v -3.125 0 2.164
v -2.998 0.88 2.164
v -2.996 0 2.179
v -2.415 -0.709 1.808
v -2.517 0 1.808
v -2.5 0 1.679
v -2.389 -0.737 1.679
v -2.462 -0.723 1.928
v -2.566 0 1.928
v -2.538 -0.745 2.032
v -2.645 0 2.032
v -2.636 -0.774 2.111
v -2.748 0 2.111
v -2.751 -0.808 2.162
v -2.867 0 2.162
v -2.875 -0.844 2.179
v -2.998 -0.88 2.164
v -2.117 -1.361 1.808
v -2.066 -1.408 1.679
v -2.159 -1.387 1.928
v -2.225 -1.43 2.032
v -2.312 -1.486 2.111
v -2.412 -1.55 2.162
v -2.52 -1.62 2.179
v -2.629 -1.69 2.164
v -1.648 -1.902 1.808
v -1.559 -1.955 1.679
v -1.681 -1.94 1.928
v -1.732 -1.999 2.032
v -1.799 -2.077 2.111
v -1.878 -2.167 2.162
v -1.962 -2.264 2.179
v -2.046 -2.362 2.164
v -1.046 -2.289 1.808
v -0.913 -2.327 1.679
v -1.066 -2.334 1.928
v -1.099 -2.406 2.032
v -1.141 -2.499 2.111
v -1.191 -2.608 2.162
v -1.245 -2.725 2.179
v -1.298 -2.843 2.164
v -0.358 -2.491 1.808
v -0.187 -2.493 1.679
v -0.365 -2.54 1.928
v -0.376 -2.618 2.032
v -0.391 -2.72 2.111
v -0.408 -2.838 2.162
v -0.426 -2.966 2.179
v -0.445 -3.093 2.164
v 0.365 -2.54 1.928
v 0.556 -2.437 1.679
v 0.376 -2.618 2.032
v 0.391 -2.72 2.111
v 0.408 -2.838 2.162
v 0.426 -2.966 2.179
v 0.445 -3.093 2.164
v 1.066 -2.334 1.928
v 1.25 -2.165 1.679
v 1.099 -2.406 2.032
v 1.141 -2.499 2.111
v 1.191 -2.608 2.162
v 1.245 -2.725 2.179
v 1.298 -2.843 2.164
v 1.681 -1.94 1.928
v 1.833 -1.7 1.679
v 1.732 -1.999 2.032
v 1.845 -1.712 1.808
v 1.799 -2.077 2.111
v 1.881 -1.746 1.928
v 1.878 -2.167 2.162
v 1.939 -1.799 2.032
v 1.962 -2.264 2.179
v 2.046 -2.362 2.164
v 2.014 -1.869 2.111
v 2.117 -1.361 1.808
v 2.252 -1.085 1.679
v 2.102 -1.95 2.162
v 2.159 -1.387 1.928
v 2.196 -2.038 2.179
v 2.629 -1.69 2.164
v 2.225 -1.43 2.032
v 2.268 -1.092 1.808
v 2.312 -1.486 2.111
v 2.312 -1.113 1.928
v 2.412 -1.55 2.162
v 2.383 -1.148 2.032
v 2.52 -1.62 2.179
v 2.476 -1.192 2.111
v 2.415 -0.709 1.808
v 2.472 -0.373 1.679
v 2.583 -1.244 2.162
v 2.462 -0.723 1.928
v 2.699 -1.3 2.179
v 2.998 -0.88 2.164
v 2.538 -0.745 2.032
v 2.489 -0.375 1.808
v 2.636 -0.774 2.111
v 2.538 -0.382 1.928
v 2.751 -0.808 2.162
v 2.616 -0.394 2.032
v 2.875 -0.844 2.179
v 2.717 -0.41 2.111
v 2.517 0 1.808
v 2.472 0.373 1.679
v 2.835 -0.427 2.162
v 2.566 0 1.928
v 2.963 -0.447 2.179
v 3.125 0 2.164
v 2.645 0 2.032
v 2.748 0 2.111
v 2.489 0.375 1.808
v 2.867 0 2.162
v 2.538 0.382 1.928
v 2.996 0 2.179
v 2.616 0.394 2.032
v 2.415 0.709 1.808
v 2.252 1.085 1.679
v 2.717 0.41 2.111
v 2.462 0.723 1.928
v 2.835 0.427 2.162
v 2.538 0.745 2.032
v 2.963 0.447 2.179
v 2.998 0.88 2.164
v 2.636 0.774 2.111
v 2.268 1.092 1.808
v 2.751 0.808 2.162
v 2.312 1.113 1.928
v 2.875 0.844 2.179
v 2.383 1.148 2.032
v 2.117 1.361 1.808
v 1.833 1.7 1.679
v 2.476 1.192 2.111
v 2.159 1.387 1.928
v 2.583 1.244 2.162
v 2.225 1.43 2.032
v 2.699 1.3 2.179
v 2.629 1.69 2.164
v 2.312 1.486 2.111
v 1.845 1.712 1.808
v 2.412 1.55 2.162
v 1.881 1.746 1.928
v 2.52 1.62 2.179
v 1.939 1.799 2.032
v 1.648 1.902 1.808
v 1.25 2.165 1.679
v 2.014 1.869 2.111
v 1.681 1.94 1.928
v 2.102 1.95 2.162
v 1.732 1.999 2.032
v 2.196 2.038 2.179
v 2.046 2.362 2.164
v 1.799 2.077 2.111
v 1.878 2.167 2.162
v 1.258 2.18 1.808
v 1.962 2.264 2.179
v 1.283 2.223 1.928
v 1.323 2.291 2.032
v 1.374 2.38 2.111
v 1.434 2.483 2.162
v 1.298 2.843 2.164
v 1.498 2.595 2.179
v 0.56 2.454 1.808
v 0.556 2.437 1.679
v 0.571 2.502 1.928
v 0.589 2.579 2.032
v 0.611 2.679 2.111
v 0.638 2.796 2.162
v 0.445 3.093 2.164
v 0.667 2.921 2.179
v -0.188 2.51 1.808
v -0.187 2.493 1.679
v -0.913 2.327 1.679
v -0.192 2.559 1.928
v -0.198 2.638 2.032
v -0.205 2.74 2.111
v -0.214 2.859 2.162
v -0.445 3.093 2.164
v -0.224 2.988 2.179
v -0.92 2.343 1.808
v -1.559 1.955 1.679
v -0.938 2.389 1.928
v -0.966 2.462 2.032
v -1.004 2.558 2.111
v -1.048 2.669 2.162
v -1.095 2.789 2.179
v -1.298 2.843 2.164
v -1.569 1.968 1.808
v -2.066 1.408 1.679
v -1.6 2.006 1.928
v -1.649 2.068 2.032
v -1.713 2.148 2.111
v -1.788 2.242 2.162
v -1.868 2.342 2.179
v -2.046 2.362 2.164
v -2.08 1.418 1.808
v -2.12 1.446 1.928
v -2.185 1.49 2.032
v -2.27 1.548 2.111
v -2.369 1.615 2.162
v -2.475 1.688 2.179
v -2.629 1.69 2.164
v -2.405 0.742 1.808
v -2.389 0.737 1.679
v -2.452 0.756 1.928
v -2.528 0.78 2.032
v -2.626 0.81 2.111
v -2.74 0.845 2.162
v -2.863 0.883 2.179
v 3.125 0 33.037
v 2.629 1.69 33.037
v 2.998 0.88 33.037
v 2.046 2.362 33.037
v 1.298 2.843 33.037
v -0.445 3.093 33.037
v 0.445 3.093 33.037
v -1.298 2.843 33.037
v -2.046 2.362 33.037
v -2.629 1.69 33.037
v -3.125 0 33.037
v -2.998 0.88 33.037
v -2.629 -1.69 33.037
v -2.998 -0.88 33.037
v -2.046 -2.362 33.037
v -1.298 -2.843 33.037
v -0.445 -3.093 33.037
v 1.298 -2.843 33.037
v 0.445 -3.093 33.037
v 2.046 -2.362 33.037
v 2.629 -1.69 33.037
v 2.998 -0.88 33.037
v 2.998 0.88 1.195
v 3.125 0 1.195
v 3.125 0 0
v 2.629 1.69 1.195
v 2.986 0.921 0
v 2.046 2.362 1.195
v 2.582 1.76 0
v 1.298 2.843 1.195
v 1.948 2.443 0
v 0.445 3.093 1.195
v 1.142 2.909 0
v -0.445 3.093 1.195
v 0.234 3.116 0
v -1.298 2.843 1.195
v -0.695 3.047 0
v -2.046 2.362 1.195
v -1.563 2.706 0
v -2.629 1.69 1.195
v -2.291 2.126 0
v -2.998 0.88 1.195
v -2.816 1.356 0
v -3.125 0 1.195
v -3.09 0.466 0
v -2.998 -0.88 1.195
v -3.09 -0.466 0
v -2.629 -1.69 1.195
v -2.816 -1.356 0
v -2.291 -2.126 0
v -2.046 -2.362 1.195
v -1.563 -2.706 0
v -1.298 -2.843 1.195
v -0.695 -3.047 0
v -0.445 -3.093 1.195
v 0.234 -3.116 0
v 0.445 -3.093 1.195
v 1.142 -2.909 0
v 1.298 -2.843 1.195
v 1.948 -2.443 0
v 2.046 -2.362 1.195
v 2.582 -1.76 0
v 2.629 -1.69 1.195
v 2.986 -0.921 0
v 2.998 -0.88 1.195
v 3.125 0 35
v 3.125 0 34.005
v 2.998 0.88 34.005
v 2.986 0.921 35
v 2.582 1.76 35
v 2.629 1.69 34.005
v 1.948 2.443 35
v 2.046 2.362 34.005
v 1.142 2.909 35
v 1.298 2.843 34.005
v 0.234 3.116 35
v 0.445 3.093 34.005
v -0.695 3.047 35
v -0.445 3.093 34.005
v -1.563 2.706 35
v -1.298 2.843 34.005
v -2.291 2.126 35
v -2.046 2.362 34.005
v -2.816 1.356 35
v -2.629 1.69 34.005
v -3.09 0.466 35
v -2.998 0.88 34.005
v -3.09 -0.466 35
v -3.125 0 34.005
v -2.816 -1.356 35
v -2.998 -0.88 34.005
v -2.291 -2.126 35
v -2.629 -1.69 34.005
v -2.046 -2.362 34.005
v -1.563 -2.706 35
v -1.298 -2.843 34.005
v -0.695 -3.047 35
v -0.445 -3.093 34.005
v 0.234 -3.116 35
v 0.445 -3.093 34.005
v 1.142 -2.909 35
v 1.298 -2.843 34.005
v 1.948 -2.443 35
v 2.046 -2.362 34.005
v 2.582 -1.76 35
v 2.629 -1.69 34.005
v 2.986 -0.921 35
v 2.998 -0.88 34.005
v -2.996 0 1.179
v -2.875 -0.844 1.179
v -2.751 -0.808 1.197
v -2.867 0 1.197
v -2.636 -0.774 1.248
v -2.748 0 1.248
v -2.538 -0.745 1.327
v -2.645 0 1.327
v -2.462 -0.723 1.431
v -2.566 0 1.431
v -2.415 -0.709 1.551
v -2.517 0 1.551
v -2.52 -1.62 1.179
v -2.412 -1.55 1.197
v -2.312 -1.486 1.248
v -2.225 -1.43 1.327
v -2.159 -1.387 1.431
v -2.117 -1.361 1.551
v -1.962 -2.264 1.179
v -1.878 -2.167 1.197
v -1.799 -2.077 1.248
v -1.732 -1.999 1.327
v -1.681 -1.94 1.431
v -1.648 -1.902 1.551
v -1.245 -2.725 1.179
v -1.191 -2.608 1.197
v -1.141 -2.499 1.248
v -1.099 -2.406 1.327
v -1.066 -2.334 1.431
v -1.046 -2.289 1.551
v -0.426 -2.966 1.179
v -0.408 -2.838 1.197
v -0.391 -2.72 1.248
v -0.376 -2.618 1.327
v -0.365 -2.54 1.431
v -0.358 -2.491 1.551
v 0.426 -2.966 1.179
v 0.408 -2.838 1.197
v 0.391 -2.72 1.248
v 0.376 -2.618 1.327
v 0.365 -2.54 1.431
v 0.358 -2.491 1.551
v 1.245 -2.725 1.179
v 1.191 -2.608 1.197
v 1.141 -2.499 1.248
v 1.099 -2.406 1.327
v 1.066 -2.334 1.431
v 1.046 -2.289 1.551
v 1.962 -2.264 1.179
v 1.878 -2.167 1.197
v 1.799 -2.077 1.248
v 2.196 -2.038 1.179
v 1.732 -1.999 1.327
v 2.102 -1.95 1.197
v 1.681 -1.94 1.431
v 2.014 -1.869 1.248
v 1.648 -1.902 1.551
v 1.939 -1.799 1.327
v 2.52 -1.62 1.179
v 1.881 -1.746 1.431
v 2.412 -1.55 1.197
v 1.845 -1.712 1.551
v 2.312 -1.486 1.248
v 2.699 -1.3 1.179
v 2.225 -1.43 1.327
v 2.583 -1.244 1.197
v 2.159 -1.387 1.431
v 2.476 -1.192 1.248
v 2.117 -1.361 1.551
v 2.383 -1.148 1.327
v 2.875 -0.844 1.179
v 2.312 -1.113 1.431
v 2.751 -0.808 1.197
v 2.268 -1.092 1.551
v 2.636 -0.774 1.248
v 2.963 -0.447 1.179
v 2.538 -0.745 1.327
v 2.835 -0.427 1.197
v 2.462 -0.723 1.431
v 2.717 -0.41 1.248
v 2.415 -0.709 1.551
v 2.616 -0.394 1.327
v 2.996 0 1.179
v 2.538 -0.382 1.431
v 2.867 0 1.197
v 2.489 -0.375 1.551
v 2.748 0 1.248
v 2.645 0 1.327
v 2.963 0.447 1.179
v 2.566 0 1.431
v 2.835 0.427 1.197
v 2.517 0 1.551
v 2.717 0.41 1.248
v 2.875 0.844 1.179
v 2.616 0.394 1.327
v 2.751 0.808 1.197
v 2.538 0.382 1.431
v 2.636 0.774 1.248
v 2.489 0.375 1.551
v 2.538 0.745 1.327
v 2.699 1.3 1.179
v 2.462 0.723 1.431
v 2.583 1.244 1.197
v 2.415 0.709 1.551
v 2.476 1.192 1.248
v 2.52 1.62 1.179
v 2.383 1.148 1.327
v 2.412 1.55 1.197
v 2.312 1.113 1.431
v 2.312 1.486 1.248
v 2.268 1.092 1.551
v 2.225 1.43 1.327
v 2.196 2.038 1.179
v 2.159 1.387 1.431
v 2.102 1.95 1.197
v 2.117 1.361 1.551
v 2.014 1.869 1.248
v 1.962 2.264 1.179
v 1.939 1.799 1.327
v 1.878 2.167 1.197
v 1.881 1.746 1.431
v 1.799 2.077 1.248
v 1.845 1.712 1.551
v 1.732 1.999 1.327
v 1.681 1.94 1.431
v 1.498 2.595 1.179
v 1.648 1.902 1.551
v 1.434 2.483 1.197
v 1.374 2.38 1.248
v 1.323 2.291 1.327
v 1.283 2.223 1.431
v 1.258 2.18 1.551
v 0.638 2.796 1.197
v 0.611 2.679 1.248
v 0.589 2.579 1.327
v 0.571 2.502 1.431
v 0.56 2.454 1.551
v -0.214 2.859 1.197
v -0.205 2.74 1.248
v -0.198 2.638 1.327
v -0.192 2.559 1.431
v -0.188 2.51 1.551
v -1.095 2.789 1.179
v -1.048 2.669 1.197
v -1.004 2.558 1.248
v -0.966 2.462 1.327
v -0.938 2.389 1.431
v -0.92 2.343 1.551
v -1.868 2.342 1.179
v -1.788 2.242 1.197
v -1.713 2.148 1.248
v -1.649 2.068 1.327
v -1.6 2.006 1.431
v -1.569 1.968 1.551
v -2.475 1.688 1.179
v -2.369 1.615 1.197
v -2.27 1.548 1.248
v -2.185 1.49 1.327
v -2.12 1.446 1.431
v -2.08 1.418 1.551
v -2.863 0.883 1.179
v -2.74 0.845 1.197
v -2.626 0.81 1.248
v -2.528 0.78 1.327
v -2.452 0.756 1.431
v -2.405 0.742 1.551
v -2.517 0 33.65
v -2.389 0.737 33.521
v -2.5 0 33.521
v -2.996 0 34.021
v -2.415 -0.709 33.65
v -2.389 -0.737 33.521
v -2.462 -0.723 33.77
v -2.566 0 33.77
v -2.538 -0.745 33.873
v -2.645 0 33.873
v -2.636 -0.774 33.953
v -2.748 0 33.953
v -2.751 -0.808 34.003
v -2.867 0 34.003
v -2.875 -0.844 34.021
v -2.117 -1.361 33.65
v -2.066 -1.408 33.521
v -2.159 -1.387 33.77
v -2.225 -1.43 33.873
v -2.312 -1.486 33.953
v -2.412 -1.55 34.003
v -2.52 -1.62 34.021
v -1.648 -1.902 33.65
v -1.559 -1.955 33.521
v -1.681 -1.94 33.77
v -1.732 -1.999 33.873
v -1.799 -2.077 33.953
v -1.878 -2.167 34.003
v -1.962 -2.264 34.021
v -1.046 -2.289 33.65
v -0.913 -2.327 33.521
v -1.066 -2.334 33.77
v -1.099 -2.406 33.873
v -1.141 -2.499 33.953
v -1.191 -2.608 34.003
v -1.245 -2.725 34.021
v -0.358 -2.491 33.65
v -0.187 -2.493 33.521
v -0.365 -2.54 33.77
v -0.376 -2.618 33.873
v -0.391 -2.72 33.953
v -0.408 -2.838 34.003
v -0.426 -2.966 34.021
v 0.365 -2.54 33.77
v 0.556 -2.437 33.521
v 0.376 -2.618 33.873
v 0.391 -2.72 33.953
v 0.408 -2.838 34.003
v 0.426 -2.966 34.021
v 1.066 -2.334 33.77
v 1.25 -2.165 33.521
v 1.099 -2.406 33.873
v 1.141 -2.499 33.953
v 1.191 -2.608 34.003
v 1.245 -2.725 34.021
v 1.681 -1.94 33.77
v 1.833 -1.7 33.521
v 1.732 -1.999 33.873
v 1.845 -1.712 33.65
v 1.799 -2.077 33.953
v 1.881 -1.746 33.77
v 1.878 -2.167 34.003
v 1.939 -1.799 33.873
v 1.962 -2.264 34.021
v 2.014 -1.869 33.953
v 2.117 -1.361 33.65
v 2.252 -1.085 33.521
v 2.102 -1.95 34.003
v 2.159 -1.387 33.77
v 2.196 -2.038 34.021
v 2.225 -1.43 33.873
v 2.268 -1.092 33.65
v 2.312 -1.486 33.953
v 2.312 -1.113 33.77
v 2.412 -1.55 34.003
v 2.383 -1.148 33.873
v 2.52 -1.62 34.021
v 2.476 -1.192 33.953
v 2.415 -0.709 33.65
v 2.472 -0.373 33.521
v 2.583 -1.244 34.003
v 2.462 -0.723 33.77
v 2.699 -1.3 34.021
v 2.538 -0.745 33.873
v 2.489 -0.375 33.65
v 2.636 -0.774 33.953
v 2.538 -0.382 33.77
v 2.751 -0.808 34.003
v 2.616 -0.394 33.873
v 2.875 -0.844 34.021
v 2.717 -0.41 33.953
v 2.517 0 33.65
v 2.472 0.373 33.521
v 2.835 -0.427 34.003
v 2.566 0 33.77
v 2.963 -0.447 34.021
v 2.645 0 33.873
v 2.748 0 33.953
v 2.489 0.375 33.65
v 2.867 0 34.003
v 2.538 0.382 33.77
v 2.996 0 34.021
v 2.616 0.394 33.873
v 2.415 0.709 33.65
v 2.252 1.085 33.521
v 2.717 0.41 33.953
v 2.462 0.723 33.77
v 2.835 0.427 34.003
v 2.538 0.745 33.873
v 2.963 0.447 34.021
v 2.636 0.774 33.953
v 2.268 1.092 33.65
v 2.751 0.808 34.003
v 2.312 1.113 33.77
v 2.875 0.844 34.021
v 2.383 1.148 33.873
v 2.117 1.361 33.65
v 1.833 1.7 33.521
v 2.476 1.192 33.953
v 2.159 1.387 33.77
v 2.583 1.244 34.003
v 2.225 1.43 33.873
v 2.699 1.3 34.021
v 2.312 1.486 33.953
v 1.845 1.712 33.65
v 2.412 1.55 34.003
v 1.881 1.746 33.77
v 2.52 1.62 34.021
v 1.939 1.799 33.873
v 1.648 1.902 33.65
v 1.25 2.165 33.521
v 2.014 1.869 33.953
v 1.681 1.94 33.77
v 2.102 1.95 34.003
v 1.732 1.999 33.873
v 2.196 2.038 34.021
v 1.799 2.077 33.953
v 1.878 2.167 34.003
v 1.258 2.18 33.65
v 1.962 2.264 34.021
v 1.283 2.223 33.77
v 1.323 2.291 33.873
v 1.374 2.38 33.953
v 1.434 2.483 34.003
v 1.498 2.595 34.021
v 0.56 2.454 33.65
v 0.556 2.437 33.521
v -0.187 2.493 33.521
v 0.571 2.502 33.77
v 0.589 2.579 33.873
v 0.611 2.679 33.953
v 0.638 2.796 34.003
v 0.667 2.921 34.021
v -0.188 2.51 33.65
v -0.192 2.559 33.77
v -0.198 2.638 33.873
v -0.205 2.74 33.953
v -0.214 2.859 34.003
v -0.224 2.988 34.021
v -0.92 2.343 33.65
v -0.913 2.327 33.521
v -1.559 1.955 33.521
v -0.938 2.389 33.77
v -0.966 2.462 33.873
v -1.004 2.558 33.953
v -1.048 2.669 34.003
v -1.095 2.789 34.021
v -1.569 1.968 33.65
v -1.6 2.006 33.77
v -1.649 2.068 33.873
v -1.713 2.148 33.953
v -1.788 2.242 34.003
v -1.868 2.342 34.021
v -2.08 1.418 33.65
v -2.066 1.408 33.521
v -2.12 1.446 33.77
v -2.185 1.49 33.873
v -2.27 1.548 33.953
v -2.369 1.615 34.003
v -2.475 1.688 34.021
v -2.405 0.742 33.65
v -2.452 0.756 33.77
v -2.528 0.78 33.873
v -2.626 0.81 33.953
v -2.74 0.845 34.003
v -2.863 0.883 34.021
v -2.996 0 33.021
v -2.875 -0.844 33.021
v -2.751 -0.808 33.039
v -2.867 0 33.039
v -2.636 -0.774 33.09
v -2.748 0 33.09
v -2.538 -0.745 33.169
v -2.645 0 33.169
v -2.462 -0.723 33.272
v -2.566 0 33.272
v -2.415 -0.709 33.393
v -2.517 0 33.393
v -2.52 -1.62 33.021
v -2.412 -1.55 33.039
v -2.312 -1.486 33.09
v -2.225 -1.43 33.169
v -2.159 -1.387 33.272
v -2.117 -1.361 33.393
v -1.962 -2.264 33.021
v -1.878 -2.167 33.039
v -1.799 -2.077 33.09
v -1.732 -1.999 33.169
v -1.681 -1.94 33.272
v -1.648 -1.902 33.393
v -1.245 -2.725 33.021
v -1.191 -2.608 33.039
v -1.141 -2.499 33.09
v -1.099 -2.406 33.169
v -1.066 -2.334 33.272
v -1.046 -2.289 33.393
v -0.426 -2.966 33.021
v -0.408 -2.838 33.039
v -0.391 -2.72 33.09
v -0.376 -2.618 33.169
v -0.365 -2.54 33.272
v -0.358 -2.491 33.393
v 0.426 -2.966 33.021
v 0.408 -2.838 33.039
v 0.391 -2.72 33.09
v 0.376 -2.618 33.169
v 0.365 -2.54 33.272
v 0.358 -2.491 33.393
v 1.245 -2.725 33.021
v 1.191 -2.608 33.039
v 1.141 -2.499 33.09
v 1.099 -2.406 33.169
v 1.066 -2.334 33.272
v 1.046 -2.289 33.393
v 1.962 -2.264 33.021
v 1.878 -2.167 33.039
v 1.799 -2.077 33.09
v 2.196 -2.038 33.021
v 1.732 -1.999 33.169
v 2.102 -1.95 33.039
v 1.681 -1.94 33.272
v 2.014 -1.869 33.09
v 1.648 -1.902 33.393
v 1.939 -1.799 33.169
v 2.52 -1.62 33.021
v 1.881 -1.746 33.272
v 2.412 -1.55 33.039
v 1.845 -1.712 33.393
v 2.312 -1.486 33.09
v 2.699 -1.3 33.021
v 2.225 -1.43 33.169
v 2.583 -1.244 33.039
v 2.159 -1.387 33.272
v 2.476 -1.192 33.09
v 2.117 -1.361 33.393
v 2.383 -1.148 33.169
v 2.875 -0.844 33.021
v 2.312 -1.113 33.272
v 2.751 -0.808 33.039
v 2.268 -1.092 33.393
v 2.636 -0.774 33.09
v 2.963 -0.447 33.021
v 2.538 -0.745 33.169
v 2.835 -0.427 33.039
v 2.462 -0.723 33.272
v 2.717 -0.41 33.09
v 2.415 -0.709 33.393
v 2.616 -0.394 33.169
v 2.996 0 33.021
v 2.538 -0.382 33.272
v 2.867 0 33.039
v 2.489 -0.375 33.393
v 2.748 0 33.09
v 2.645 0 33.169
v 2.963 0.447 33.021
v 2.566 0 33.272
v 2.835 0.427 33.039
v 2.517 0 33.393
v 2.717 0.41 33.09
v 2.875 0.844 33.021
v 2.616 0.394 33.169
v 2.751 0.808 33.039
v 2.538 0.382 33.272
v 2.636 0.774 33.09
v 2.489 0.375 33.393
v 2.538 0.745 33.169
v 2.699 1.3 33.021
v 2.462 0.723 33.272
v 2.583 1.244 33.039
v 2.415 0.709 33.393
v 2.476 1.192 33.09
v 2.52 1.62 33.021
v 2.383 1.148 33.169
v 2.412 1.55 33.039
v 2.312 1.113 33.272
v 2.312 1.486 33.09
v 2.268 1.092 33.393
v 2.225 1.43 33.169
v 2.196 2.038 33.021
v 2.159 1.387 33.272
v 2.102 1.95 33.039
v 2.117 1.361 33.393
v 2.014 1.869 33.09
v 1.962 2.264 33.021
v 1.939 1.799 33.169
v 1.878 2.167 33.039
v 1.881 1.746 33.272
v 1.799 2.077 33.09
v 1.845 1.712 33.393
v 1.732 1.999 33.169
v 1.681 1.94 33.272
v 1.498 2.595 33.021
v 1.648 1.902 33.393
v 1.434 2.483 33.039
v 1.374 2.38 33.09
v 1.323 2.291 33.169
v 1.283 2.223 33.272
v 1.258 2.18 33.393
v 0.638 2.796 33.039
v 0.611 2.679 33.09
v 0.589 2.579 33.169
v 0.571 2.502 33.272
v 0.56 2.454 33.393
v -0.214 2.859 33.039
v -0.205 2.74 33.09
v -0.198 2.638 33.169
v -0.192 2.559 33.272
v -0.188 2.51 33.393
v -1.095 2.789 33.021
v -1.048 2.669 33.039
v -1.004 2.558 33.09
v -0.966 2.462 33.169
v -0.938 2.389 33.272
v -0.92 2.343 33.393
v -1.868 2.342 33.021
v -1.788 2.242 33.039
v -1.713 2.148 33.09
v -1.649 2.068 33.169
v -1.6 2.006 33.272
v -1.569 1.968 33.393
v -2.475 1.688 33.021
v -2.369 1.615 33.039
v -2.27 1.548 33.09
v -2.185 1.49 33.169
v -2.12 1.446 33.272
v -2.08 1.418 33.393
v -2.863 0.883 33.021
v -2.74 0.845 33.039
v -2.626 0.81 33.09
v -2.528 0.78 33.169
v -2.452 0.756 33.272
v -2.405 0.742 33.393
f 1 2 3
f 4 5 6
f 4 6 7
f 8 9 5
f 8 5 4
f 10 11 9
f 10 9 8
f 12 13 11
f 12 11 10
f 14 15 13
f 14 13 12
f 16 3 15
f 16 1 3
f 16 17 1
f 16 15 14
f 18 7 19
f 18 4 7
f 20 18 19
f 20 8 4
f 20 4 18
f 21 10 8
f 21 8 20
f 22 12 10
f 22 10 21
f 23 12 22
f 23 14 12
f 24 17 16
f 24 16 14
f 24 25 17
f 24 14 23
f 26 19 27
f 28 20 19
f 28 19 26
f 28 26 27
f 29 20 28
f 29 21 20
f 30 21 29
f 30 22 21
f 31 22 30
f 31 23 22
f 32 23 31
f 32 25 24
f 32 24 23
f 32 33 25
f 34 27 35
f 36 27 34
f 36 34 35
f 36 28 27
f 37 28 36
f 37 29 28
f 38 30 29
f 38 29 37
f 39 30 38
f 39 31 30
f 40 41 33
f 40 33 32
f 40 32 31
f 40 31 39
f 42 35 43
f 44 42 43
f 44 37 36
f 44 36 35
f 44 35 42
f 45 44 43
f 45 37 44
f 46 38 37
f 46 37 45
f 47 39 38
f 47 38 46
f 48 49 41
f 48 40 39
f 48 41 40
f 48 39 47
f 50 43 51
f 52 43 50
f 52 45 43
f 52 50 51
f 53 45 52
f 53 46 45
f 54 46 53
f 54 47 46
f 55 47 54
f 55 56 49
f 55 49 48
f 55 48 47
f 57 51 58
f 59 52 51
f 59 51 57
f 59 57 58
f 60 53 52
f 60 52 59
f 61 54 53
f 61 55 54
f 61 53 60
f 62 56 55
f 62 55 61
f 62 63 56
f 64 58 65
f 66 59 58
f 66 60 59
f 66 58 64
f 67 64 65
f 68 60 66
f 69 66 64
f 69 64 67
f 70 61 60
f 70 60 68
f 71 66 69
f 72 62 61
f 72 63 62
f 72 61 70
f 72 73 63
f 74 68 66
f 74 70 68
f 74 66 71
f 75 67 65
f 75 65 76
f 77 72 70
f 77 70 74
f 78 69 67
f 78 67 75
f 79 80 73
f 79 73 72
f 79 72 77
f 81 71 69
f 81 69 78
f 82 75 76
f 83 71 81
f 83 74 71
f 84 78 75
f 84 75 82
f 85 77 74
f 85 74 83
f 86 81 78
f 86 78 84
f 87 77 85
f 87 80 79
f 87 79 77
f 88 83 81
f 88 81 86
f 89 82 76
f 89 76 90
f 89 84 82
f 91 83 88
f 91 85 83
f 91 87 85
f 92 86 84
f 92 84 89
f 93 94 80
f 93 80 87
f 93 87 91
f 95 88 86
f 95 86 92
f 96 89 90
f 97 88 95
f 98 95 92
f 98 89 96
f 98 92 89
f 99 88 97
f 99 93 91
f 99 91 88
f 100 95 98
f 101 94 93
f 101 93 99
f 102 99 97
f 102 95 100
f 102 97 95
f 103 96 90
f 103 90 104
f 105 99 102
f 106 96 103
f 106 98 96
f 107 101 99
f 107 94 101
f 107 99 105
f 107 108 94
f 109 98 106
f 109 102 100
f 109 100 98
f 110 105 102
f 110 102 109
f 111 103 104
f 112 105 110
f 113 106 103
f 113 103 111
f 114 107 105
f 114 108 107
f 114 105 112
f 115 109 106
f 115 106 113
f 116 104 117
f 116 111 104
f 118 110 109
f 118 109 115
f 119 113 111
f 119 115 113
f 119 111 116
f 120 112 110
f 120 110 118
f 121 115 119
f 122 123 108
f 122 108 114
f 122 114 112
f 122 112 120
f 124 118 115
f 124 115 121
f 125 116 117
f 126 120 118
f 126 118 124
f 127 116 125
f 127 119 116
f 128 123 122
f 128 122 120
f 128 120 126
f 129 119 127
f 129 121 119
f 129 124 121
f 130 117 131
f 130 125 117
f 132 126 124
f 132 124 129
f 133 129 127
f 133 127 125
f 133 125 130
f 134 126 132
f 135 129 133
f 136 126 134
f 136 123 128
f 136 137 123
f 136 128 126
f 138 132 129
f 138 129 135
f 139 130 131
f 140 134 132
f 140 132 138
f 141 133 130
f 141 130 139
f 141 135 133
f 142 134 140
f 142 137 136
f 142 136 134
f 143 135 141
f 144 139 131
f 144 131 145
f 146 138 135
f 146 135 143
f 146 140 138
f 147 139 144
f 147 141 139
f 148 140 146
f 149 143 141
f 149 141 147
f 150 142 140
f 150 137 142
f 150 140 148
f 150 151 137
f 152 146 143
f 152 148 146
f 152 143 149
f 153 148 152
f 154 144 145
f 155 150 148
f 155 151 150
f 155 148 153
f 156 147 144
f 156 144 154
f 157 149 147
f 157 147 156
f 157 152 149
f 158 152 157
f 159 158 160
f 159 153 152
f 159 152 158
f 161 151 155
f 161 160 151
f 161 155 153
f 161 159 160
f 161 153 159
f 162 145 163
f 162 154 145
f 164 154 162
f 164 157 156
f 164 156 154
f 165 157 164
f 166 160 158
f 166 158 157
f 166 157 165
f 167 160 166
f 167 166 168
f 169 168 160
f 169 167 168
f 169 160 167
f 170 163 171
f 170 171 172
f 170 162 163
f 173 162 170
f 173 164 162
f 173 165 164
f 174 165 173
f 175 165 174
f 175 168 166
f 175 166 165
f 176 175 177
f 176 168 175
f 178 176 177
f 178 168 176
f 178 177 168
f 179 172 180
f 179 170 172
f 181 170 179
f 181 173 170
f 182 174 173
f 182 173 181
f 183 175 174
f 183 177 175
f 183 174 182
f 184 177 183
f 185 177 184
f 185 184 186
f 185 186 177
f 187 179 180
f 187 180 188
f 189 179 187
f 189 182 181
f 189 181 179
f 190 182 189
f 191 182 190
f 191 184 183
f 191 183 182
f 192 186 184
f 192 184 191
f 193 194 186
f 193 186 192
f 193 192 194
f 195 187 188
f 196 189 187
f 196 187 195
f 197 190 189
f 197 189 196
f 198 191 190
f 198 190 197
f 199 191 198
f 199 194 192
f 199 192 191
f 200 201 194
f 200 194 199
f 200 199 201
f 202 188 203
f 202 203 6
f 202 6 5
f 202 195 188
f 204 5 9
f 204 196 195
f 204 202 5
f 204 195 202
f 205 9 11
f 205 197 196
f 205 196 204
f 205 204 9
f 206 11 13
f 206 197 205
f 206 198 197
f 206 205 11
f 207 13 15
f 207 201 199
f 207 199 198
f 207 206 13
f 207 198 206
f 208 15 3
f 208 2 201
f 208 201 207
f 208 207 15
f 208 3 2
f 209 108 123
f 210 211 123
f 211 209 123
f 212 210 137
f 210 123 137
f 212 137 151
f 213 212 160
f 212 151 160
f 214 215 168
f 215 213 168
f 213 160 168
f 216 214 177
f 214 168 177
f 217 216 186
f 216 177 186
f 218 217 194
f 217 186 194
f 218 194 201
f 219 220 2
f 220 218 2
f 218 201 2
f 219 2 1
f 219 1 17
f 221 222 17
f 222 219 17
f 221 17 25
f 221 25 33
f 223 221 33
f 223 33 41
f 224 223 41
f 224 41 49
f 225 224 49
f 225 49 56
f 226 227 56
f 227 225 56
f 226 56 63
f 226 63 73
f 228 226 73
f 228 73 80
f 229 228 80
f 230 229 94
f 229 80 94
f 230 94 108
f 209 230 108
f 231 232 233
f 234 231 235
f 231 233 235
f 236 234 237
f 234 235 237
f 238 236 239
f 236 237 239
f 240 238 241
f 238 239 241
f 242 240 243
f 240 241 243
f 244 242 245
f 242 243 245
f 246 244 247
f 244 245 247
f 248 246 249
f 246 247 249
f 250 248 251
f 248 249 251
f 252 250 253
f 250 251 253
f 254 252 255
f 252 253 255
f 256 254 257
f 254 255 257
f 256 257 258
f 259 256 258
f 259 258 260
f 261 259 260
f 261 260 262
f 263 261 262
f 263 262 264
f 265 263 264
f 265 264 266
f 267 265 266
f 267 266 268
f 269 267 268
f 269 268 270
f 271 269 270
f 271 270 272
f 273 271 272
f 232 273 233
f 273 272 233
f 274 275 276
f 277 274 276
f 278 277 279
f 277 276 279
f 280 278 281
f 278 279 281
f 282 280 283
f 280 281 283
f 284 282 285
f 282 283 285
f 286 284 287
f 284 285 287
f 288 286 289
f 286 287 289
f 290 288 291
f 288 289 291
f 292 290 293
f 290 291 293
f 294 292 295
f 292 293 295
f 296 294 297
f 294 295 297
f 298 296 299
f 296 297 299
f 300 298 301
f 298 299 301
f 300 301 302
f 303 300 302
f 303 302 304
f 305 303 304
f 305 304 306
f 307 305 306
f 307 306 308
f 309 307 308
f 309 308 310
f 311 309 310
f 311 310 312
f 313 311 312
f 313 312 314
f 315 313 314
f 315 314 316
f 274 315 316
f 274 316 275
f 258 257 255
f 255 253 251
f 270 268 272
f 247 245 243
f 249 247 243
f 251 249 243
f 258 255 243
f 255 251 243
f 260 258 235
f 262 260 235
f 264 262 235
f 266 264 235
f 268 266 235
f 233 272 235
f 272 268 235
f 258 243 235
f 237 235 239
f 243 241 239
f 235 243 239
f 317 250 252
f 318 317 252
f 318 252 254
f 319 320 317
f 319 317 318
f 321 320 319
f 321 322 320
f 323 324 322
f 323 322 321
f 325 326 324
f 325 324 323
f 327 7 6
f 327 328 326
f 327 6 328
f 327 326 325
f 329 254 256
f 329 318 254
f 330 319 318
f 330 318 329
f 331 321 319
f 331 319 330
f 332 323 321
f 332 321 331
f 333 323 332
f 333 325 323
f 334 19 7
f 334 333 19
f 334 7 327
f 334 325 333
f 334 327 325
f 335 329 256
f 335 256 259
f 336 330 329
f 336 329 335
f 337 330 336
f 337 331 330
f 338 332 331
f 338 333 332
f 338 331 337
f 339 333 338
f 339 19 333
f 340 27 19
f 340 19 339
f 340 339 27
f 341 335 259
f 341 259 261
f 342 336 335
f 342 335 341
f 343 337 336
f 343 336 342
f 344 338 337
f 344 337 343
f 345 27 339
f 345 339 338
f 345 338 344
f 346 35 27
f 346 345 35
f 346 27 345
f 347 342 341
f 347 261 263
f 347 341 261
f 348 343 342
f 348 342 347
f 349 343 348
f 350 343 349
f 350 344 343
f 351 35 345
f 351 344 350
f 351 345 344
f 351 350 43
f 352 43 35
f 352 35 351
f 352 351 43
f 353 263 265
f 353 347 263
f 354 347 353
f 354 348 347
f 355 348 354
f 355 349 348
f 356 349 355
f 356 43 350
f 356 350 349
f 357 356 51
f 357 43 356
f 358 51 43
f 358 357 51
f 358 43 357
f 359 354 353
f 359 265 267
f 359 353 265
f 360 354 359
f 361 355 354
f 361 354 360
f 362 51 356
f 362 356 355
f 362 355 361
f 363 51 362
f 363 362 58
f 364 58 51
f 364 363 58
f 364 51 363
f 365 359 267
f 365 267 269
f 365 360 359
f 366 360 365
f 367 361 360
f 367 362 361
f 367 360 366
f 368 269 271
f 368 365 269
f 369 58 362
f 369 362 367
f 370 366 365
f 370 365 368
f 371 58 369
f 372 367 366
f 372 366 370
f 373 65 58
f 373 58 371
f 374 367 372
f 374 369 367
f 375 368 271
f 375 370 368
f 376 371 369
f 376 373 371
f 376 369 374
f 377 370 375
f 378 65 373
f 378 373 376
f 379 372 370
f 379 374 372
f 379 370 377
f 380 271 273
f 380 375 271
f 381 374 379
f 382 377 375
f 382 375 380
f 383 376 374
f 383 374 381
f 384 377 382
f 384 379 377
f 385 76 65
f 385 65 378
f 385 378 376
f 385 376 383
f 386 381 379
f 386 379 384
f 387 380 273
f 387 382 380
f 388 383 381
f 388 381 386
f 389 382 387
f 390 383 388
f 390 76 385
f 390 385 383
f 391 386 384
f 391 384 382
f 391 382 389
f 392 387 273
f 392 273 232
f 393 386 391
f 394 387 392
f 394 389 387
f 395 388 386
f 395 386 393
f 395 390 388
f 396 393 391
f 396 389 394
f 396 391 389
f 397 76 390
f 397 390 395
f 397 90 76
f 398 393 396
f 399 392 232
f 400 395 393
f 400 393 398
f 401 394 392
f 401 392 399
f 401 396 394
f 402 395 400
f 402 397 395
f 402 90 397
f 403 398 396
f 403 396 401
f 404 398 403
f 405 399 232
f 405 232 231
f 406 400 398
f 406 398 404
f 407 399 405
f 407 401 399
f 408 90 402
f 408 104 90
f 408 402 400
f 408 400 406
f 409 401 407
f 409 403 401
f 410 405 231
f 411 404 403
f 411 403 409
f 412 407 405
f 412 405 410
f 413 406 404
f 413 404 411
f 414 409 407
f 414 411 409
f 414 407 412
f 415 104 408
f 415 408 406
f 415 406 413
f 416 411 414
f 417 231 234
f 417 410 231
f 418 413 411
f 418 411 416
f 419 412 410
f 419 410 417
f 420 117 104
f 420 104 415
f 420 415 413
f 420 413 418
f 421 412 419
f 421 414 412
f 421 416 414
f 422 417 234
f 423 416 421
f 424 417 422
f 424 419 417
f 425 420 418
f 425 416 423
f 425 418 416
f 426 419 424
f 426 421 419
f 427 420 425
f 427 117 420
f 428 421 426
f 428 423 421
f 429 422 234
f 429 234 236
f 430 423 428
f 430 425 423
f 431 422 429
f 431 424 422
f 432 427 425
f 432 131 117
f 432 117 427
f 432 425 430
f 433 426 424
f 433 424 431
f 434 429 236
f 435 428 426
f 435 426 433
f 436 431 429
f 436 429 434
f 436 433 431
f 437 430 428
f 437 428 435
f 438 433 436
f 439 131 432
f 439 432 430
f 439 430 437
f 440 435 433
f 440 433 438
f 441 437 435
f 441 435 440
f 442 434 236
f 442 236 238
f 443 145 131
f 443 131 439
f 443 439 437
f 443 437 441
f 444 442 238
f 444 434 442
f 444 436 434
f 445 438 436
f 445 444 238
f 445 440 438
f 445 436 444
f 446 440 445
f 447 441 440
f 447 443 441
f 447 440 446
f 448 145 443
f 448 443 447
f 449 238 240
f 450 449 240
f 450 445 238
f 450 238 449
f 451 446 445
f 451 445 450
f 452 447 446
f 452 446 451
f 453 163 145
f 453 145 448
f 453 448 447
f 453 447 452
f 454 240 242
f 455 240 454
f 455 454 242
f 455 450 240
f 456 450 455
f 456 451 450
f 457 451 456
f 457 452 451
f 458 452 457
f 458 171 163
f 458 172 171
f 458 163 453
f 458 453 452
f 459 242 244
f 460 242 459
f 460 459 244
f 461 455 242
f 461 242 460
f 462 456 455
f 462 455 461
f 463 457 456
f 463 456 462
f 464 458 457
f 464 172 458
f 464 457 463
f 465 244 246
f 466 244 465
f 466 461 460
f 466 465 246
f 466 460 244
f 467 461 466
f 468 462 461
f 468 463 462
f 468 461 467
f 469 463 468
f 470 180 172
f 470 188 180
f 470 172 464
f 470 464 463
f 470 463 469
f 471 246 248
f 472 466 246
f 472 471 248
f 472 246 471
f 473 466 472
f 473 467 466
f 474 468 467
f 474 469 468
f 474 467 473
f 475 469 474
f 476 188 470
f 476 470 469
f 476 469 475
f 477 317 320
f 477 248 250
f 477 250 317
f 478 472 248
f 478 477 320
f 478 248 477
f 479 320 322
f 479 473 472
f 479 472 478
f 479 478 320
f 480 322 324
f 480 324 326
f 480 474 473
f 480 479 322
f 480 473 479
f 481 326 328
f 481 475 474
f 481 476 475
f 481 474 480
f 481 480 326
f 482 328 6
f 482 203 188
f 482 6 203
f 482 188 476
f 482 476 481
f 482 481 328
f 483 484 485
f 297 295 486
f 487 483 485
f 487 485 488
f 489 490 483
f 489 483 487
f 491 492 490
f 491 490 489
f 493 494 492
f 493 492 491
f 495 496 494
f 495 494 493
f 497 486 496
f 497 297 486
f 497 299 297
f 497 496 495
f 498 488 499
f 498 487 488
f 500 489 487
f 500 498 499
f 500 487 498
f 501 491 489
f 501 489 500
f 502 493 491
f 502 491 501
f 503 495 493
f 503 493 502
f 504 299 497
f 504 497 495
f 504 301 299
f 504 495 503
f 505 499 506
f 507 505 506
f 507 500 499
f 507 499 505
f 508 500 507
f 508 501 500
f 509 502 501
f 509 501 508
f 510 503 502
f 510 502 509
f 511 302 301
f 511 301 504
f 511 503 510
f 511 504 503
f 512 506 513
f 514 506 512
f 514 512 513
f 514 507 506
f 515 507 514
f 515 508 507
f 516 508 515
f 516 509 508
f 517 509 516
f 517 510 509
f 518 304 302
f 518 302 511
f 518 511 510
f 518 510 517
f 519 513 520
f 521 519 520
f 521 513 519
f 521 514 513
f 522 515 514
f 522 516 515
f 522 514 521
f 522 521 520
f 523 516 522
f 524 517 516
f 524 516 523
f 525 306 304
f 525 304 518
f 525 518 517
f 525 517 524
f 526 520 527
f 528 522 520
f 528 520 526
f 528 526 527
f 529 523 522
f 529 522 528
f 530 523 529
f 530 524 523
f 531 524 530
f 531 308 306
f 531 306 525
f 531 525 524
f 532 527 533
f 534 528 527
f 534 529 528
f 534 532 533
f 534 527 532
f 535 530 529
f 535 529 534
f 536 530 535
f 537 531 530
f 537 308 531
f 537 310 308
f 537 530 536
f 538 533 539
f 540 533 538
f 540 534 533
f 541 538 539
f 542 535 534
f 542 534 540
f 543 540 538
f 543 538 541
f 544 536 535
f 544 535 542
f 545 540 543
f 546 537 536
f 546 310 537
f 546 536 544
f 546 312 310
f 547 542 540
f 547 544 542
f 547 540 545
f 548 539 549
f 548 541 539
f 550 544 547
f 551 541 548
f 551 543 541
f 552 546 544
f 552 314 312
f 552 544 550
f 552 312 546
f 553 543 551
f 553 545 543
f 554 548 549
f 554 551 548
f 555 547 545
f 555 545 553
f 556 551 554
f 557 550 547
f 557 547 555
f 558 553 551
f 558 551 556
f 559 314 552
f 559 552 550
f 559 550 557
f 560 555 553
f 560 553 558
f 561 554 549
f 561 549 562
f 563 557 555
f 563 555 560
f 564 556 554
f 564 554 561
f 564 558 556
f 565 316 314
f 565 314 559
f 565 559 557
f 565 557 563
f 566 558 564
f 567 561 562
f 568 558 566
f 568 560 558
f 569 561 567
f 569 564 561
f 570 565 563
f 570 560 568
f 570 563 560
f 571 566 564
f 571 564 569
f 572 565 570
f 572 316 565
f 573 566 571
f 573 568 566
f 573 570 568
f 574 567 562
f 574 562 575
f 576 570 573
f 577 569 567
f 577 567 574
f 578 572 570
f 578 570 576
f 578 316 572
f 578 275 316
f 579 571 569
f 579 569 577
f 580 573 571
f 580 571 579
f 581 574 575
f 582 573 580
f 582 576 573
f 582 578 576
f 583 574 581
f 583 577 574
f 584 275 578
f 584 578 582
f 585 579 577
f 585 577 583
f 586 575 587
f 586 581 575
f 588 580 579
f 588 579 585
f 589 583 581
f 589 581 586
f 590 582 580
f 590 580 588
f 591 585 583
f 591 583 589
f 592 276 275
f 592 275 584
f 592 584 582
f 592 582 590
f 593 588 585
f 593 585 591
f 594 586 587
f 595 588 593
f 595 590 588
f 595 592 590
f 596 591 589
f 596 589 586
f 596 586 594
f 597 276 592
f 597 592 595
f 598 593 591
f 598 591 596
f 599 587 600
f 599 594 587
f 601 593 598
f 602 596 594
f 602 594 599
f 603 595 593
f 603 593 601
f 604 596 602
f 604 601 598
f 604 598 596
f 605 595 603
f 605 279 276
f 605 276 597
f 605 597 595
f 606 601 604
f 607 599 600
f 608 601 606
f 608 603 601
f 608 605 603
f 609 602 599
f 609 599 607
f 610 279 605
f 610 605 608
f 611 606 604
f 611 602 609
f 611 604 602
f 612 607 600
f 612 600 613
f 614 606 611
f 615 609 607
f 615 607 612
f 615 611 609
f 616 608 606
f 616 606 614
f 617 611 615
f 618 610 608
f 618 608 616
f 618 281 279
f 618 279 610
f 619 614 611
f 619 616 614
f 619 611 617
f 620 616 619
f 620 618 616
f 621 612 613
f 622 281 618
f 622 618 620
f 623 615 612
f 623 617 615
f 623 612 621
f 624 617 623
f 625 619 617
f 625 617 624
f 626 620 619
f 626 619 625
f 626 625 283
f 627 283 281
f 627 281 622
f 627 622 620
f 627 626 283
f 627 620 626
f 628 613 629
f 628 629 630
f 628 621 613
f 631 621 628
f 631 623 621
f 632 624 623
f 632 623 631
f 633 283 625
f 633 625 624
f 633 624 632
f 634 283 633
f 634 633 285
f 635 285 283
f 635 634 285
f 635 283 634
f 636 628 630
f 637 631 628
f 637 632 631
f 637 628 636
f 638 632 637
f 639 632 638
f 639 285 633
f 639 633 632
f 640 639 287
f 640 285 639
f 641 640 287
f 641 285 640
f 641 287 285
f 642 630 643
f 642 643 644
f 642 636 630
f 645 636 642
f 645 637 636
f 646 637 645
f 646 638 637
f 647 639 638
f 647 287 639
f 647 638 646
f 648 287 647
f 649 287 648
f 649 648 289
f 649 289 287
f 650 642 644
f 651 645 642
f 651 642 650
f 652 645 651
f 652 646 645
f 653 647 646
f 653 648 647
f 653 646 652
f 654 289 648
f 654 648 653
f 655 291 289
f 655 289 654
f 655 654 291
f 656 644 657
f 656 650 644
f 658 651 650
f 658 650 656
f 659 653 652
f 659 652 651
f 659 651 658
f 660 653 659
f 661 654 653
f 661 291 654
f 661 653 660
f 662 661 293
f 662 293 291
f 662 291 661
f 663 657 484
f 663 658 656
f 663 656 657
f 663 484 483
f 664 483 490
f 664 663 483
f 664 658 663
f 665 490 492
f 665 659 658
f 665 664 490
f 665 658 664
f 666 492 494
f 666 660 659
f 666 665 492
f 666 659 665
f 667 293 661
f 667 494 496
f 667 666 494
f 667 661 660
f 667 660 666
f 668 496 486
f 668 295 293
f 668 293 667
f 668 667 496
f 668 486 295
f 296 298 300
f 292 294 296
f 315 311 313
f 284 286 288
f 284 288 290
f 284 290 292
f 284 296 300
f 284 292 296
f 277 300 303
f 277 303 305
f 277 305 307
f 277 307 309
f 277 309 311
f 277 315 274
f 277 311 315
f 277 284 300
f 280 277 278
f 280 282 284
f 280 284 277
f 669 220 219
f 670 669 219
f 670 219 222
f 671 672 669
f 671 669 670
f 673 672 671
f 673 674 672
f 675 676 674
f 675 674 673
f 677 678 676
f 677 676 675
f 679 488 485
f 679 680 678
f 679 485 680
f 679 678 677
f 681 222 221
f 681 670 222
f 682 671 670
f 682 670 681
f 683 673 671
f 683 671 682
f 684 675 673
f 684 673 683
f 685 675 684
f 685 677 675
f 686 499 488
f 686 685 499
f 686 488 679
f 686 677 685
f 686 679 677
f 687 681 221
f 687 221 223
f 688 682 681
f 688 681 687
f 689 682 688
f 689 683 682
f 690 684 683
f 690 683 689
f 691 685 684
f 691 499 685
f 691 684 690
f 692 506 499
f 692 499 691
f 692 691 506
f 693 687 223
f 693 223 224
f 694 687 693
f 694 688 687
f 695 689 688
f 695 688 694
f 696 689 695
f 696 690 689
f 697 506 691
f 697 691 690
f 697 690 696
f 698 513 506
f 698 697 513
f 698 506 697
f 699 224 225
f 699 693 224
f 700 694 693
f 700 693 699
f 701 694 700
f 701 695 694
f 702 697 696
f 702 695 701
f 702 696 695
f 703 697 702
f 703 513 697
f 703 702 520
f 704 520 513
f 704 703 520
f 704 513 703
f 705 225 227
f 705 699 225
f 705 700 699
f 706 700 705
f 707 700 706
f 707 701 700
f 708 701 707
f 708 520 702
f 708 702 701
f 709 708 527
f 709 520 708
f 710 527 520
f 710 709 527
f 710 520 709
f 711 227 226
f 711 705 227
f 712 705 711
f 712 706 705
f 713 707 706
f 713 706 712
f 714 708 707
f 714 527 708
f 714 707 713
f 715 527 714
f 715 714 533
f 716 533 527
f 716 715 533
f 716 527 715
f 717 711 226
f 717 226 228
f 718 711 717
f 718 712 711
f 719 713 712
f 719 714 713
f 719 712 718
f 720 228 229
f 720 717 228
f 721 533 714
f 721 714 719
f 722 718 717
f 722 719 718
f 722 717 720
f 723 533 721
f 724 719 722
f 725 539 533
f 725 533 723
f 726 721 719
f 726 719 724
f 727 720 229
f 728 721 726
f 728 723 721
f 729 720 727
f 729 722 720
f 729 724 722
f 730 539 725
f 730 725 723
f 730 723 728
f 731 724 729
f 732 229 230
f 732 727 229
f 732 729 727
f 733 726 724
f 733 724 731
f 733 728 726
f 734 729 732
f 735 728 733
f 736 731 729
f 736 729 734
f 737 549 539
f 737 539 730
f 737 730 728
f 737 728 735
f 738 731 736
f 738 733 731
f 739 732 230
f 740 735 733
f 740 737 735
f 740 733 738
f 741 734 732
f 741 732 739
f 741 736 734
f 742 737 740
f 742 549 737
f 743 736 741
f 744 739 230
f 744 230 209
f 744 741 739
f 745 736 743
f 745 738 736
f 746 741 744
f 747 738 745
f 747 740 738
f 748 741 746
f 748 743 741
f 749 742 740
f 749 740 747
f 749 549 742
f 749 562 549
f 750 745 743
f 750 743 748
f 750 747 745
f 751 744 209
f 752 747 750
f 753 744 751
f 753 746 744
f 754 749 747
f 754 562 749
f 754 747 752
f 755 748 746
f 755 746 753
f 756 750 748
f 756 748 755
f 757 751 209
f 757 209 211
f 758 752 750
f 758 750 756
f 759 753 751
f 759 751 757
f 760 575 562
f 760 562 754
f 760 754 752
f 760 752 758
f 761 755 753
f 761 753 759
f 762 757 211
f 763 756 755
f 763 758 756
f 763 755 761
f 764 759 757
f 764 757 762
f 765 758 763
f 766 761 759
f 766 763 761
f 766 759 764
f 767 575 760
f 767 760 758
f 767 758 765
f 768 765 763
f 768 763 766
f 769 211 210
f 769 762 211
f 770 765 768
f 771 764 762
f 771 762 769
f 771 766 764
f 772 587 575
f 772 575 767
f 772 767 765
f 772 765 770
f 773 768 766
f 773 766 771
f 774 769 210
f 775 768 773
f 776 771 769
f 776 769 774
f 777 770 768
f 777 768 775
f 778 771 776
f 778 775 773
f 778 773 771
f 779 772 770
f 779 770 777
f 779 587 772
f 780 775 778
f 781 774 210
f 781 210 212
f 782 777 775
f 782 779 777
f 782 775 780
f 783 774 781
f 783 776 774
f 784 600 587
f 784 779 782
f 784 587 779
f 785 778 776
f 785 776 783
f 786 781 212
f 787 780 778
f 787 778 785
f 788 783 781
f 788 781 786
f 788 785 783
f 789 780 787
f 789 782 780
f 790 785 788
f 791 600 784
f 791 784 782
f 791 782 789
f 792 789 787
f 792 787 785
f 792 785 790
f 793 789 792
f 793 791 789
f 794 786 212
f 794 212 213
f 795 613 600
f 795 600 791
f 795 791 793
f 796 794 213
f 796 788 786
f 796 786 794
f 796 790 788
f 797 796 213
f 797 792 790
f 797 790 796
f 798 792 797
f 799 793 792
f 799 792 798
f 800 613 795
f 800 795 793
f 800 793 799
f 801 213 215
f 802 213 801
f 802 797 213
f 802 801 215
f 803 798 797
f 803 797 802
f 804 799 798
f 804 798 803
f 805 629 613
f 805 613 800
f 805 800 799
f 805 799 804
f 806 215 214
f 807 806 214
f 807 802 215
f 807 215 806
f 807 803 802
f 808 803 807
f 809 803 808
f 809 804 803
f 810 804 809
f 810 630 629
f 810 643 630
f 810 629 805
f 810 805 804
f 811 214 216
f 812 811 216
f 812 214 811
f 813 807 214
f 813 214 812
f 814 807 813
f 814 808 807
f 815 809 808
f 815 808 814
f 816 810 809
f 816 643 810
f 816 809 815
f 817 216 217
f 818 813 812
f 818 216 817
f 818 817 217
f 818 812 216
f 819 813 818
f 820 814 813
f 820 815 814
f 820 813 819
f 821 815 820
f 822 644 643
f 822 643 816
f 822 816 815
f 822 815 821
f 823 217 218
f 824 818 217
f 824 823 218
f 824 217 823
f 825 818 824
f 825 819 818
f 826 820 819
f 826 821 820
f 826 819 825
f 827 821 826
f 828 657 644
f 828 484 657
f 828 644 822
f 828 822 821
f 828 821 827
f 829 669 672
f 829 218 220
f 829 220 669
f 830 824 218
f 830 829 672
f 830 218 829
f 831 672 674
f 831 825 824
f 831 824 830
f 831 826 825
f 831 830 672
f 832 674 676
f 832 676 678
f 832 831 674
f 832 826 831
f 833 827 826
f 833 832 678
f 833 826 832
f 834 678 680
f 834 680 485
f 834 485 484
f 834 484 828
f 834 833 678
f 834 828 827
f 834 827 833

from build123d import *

# Parameters (mm, degrees)
F0_R     = 3.125
F1_DEPTH = 35
F2_R     = 0.5
F4_R     = 0.5


with BuildPart() as f1:
    # F0 (on Top) → F1 (new body)
    with BuildSketch(Plane.XY):
        Circle(F0_R)
    extrude(amount=F1_DEPTH)

    # F2 (on Front) → F3 (revolve, cut)
    with BuildSketch(Plane.XZ):
        with Locations((-3, 1.679414)):
            Circle(F2_R)
    revolve(axis=Axis((0, 0, 0.03065), (0, 0, 1)), mode=Mode.SUBTRACT)

    # F4 (on Front) → F5 (revolve, cut)
    with BuildSketch(Plane.XZ):
        with Locations((-3, 33.521309)):
            Circle(F4_R)
    revolve(axis=Axis((0, 0, 20.967992), (0, 0, 1)), mode=Mode.SUBTRACT)


solid = f1.part
